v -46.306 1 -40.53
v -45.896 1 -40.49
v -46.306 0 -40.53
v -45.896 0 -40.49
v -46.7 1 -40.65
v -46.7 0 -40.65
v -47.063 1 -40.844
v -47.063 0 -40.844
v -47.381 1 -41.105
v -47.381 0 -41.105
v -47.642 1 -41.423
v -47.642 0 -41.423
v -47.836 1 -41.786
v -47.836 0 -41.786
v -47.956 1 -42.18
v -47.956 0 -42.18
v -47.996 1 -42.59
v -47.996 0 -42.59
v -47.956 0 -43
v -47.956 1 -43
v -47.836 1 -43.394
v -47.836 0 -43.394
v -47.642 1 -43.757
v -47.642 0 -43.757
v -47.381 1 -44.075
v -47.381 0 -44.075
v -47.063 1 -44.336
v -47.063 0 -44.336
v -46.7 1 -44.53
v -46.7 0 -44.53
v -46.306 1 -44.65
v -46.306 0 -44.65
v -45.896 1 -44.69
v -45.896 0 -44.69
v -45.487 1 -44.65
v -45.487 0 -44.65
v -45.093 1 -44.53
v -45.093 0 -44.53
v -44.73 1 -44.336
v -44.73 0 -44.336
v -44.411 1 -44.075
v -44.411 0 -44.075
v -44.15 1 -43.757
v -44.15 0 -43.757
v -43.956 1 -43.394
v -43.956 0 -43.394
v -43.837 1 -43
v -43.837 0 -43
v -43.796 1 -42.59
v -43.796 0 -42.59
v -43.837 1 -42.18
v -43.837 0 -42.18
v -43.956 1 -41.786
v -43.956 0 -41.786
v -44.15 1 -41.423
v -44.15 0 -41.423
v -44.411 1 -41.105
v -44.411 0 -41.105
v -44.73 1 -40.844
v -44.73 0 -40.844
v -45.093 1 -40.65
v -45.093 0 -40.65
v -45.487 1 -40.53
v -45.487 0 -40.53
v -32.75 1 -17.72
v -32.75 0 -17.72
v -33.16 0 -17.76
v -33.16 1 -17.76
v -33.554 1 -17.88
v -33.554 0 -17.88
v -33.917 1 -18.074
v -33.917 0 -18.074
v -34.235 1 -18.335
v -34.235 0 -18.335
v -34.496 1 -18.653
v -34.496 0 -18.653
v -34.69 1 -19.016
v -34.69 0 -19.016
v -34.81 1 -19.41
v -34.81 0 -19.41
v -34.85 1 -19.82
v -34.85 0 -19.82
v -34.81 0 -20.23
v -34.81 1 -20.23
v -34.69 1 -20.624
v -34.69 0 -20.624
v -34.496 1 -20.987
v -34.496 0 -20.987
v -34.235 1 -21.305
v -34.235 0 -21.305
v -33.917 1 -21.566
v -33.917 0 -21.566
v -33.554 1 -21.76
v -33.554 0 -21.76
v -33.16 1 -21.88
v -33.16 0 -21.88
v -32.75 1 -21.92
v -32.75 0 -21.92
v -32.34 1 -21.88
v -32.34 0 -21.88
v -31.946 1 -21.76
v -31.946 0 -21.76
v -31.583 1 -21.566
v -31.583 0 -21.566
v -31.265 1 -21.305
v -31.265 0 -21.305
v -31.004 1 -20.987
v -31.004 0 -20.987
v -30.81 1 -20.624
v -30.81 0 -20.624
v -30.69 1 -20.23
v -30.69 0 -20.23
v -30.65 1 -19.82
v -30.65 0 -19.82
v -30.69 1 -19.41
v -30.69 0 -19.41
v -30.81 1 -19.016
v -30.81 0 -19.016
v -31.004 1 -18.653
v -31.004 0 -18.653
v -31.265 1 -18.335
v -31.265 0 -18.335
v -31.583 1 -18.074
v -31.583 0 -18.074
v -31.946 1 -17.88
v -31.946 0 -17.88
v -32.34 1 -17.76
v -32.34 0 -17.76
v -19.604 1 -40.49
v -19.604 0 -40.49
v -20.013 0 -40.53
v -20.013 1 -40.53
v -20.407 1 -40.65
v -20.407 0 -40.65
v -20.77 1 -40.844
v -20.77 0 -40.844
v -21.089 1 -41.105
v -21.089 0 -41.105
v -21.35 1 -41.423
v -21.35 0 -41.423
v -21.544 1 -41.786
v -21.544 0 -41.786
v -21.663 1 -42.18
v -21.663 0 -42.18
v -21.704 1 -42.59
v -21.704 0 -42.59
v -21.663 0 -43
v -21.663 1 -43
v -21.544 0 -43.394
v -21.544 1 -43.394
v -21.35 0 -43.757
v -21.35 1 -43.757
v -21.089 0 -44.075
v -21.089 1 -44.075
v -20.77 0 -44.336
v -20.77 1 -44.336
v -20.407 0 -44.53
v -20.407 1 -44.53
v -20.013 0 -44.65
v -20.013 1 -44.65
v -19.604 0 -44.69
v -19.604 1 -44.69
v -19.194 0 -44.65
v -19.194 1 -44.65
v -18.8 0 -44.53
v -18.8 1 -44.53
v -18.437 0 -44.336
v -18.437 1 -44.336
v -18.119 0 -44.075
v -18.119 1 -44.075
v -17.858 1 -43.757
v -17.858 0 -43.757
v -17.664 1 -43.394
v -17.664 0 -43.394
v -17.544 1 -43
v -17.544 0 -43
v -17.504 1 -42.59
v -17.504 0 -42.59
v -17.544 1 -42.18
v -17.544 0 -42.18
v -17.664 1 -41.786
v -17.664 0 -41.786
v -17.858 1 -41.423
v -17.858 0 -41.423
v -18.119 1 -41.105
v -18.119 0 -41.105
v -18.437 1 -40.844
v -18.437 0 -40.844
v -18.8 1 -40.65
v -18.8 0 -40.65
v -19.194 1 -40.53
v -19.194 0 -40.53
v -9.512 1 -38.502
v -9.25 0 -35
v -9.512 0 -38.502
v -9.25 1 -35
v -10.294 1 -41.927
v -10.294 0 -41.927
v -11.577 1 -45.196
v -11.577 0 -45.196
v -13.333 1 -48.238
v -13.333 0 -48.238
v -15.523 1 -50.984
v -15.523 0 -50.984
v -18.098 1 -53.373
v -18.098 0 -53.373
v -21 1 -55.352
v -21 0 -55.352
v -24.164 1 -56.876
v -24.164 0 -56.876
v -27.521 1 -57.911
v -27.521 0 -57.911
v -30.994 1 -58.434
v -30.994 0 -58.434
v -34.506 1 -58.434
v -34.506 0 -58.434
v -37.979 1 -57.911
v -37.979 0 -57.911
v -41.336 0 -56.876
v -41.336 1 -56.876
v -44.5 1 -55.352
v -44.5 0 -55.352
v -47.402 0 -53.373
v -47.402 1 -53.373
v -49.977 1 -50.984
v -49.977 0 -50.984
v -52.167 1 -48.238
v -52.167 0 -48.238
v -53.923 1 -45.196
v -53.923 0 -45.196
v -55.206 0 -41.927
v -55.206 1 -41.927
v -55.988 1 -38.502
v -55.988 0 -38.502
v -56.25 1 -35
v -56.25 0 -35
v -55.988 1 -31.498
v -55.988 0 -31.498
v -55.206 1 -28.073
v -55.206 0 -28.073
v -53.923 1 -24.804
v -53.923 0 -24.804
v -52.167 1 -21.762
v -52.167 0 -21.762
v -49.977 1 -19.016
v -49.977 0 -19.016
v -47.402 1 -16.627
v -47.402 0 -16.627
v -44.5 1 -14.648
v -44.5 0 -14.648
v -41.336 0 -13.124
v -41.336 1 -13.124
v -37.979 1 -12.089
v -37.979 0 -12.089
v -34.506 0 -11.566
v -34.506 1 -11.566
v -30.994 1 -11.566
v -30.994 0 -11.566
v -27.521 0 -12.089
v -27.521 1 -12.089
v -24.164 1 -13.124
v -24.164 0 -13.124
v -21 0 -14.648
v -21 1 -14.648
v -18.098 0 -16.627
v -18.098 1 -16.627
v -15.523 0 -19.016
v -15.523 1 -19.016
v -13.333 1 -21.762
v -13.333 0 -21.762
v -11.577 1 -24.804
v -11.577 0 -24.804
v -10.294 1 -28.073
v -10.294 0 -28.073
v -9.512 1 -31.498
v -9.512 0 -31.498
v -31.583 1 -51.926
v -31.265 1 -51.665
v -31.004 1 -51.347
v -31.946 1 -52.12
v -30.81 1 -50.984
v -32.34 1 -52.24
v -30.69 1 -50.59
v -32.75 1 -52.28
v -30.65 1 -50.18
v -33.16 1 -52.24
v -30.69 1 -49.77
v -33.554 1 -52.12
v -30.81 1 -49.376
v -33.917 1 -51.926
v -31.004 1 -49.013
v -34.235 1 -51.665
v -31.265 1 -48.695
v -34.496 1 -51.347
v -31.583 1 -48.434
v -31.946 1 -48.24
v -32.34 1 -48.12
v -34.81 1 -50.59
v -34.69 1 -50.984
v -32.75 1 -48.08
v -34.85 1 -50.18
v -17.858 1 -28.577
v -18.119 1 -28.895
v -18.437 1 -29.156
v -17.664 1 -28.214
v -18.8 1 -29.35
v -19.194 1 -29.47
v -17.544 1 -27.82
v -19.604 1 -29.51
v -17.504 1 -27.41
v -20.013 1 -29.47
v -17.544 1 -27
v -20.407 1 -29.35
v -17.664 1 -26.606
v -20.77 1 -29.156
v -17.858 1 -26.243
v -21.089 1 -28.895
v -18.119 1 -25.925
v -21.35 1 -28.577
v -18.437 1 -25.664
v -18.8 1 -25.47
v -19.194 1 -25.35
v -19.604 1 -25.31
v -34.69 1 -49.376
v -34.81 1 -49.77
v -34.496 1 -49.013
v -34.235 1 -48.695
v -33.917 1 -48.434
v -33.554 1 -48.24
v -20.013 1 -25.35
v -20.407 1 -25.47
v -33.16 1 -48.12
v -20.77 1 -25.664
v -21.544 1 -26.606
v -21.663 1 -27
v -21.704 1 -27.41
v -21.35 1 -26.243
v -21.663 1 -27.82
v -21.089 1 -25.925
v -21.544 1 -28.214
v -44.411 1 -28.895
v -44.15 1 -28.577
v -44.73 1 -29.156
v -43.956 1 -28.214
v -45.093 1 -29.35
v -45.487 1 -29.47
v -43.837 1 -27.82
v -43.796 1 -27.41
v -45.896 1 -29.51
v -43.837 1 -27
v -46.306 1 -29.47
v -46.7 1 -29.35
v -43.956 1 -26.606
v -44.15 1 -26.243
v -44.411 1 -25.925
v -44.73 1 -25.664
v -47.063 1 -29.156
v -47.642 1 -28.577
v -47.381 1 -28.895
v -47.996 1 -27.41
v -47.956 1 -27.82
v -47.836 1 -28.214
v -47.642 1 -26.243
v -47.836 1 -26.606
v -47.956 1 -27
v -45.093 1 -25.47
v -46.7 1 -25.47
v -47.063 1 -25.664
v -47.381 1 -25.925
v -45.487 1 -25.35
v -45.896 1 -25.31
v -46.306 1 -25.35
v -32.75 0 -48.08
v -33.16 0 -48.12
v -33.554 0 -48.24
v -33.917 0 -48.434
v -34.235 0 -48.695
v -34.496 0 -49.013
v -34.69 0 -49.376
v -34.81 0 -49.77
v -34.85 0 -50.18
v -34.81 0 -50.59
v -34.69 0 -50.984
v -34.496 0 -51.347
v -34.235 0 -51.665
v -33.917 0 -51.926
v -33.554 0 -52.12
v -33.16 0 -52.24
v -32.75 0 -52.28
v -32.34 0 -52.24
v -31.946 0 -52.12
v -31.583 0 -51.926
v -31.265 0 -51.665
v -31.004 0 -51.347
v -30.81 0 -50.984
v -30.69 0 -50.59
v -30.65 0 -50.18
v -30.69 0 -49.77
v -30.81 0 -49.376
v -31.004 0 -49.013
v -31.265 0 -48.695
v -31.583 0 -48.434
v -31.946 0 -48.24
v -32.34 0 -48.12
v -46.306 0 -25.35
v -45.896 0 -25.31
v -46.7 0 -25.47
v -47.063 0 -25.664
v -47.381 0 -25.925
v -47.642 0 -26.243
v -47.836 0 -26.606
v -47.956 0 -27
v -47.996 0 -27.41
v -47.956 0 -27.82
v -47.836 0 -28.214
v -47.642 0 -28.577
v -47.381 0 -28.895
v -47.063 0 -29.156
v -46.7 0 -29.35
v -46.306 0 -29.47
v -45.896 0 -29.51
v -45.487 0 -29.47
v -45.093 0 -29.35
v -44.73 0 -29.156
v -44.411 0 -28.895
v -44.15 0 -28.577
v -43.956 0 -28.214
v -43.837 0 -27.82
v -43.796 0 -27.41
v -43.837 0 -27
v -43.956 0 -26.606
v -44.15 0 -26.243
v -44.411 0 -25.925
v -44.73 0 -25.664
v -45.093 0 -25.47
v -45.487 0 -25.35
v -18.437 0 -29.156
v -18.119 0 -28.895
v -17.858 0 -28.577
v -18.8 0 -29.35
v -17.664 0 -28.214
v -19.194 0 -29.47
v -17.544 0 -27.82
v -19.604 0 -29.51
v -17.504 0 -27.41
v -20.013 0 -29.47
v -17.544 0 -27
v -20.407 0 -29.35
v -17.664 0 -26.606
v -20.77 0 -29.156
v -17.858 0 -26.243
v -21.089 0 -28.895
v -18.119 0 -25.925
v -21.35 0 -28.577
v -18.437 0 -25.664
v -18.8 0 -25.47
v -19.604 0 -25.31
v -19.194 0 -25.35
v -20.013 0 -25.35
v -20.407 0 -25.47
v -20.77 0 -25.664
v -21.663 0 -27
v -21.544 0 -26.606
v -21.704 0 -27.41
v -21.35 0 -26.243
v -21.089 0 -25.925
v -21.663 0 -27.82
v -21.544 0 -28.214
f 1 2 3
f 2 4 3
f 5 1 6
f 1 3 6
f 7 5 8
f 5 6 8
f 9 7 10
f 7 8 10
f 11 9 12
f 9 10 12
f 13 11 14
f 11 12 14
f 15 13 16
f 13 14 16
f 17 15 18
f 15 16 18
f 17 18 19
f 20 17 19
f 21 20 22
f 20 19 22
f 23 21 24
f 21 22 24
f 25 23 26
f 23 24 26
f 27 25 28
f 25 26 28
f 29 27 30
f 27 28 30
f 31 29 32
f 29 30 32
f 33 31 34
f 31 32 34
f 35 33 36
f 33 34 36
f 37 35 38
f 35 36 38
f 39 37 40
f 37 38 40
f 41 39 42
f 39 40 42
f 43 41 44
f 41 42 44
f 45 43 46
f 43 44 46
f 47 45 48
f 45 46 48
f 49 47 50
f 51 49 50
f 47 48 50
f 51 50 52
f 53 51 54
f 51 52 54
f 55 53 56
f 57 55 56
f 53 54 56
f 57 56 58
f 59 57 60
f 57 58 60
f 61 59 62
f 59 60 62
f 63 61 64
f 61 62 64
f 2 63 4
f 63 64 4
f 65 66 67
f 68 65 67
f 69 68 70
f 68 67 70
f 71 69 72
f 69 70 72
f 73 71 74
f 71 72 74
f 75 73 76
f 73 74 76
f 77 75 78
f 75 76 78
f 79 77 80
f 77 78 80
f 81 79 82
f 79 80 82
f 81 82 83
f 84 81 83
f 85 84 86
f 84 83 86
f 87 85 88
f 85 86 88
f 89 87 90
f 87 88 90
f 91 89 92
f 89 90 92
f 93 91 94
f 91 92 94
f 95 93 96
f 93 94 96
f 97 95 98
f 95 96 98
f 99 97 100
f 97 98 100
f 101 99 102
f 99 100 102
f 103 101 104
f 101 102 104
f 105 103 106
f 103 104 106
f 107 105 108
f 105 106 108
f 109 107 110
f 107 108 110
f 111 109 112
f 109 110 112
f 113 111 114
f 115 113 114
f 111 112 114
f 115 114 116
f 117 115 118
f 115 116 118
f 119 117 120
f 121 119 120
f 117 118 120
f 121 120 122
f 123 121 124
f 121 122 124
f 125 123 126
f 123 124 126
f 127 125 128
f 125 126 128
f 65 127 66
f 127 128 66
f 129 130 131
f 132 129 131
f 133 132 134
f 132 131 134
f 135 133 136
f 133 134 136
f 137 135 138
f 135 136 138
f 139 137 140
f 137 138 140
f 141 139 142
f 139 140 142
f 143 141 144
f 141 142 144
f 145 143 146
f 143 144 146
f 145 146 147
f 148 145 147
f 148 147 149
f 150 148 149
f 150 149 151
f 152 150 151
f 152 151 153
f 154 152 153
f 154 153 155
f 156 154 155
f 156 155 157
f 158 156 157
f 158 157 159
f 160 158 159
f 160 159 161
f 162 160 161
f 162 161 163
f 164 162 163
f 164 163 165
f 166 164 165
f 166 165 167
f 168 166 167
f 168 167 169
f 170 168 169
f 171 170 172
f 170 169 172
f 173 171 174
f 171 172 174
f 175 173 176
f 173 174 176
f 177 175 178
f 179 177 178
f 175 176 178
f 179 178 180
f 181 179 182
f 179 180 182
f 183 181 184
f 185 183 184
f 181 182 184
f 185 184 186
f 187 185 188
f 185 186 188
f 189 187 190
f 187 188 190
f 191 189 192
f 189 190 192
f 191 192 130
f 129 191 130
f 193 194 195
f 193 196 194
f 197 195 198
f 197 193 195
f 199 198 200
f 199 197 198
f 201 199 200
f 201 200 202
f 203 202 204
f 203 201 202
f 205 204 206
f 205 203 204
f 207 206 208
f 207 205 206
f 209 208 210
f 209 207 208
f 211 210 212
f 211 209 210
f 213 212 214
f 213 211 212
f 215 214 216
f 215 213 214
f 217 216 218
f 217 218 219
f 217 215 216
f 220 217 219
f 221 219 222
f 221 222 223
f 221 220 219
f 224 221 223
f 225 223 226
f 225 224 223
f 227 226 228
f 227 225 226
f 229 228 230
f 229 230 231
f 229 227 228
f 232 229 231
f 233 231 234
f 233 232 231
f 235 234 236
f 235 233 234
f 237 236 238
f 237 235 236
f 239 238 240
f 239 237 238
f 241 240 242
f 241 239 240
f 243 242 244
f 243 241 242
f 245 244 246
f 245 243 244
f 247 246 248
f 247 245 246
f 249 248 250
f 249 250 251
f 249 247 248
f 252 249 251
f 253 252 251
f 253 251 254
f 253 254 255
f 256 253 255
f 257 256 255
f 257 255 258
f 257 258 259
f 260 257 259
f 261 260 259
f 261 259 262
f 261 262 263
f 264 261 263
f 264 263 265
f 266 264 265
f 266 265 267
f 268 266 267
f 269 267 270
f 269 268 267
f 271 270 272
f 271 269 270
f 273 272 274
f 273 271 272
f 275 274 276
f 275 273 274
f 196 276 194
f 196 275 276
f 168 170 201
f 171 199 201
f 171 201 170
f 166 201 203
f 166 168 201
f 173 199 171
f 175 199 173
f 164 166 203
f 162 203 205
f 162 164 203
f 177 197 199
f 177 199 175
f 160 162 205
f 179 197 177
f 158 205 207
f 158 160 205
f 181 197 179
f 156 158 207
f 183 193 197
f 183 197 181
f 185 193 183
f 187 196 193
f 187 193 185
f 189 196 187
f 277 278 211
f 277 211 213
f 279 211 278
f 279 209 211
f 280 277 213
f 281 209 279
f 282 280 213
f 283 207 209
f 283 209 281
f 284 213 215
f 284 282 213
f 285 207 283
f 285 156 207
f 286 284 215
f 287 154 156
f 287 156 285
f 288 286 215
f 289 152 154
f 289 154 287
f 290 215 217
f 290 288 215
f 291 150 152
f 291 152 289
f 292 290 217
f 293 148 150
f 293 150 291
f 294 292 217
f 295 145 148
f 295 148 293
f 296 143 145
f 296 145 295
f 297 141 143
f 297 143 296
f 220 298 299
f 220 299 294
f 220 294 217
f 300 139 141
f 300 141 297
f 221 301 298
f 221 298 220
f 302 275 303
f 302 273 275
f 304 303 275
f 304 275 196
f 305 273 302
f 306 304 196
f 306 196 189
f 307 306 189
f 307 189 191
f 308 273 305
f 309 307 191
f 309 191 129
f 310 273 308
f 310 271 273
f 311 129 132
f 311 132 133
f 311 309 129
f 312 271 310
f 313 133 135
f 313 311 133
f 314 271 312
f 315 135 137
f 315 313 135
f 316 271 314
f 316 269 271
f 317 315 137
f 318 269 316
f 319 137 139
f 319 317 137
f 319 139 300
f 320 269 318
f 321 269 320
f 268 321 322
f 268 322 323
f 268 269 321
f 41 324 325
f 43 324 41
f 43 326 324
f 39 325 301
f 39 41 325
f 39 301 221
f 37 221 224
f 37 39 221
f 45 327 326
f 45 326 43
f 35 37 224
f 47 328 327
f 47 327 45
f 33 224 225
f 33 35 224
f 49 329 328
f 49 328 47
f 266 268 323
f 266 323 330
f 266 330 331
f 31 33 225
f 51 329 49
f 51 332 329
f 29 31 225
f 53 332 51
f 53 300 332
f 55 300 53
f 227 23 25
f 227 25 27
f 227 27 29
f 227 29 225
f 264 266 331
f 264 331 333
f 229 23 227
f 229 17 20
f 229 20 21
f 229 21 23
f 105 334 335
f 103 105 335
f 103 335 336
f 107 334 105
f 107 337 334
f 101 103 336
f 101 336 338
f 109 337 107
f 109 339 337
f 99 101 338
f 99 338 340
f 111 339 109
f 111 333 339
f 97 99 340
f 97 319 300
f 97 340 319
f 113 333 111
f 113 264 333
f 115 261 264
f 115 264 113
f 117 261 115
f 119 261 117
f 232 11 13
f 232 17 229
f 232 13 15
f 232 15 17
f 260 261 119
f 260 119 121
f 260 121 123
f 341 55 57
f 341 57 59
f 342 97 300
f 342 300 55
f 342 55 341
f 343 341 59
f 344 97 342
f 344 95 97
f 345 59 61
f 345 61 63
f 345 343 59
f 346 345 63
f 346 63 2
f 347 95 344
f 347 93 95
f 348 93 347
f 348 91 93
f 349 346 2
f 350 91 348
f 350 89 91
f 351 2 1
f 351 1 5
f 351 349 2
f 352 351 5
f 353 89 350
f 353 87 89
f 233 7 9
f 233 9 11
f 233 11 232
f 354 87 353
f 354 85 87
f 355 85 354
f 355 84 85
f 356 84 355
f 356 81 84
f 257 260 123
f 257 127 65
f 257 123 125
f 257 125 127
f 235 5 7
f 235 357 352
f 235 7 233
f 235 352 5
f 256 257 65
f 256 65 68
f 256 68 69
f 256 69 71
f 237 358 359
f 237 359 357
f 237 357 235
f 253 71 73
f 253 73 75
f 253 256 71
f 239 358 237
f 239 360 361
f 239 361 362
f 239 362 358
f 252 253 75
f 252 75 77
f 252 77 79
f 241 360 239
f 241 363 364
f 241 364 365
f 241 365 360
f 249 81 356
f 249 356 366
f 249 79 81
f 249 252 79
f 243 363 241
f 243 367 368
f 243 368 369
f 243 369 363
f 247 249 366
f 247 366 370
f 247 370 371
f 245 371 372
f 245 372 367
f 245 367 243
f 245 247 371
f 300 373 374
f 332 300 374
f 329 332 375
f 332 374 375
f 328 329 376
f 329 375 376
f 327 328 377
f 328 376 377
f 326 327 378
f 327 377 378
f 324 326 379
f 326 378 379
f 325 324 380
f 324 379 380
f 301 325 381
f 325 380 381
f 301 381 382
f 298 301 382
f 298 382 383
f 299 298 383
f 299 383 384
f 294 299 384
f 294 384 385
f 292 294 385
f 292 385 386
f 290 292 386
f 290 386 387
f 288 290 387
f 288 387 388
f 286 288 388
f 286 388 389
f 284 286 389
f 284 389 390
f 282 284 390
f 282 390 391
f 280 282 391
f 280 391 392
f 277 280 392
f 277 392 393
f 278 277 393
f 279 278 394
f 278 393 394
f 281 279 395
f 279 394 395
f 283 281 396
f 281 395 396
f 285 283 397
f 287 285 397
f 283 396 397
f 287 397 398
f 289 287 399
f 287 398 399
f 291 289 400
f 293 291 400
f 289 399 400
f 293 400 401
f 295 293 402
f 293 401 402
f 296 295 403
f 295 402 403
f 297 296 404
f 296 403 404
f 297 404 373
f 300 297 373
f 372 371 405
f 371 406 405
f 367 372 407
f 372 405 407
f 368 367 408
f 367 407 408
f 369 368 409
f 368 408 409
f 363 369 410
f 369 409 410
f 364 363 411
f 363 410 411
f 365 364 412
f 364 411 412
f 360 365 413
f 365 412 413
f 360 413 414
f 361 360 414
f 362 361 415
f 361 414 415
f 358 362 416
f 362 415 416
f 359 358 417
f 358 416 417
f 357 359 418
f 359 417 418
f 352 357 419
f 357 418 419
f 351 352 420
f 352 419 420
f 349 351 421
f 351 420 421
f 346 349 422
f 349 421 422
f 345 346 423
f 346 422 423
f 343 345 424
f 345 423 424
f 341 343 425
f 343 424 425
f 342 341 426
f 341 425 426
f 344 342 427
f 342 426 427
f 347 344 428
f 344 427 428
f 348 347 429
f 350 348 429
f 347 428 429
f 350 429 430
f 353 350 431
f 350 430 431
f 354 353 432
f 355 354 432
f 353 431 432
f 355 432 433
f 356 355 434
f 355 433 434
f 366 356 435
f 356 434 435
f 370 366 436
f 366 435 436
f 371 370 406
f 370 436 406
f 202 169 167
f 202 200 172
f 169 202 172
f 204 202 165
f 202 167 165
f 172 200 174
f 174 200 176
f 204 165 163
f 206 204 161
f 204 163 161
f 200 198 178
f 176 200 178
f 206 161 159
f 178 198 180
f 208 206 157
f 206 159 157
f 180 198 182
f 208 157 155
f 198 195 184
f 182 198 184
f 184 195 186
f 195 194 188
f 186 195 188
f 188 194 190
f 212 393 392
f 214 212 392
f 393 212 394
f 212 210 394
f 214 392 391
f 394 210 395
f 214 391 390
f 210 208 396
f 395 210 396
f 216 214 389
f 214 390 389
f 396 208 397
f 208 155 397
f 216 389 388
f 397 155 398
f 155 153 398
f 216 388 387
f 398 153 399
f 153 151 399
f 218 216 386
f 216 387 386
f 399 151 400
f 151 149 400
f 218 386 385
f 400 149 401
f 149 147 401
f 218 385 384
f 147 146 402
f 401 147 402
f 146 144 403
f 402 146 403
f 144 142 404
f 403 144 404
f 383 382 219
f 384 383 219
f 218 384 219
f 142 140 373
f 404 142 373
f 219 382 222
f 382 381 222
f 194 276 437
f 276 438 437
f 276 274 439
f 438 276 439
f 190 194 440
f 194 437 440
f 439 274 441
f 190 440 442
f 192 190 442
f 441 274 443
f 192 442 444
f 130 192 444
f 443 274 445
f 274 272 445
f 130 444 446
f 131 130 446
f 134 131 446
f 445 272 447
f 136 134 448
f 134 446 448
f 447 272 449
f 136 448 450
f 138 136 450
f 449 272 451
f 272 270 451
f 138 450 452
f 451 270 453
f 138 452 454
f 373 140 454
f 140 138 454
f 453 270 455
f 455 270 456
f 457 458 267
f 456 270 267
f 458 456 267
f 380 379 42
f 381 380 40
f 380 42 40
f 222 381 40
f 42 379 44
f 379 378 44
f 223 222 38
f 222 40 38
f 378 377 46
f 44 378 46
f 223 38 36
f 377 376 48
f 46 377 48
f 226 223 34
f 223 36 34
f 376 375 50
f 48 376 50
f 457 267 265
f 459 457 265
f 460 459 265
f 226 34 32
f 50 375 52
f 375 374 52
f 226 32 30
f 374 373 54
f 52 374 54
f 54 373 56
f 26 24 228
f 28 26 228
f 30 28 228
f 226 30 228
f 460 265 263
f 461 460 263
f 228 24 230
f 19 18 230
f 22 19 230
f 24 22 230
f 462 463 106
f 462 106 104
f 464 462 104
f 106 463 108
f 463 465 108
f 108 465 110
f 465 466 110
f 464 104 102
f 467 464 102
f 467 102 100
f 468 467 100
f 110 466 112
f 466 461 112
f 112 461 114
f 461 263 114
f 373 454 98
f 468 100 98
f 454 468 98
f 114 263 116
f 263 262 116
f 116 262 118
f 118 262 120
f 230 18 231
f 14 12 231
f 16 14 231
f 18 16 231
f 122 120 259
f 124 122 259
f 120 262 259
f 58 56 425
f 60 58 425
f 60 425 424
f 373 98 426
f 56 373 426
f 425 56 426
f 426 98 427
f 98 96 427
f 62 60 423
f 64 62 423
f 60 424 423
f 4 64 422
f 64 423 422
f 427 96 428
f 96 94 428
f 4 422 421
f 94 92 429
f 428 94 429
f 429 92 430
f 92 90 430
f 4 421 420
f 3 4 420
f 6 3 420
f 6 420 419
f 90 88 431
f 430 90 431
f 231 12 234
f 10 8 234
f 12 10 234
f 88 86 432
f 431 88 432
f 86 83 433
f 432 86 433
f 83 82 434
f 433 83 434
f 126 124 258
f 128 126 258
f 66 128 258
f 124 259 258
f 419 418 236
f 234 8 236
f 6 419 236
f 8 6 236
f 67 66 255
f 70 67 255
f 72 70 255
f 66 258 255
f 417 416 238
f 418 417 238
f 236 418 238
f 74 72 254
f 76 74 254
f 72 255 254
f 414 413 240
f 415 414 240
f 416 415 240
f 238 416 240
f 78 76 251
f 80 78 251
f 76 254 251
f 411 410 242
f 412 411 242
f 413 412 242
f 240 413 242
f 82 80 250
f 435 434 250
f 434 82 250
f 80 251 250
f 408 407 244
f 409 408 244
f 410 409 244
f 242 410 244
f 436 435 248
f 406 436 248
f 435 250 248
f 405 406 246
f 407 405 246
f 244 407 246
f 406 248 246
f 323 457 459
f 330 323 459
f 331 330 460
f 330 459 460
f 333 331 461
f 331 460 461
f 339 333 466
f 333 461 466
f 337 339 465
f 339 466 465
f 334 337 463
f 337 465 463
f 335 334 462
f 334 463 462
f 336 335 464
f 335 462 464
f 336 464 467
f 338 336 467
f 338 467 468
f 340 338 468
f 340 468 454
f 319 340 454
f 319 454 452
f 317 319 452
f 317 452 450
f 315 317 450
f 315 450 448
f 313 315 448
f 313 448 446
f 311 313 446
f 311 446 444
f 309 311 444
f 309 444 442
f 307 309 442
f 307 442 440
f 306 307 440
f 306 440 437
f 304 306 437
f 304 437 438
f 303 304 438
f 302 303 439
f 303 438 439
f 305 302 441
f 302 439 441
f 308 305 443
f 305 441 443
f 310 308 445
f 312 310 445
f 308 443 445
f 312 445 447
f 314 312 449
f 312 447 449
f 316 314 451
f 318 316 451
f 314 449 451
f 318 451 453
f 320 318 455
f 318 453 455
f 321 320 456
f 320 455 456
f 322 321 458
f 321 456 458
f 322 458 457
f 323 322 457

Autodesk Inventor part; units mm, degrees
ref_plane "YZ Plane" through (0, 0, 0) normal (1, 0, 0) x (0, 1, 0)
ref_plane "XZ Plane" through (0, 0, 0) normal (0, 1, 0) x (-1, 0, 0)
ref_plane "XY Plane" through (0, 0, 0) normal (0, 0, 1) x (1, 0, 0)
sketch "スケッチ1" plane through (0, 0, 0) normal (0, 1, 0) x (-1, 0, 0)
  line L0 (0, 0) -> (65.5, 0)
  line L1 (65.5, 0) -> (65.5, -70)
  line L2 (65.5, -70) -> (0, -70)
  line L3 (0, -70) -> (0, 0)
  dimension "d0" = 65.5
  dimension "d1" = 70
extrude "押し出し1" add sketch "スケッチ1" along normal blind 1
sketch "スケッチ3" plane through (0, 1, 0) normal (0, 1, 0) x (1, 0, 0)
  line L0 (-65.5, 0) -> (0, 0) projected
  line L1 (-32.75, 0) -> (-32.75, 70)
  line L2 (0, 70) -> (-65.5, 70) projected
  circle A0 centre (-32.75, 35) radius 15.18
  point P0 (-32.75, 50.18)
  point P1 (-45.8963, 42.59)
  point P2 (-45.8963, 27.41)
  point P3 (-32.75, 19.82)
  point P4 (-19.6037, 27.41)
  point P5 (-19.6037, 42.59)
  dimension "d15" = 30.36
  dimension "d18" = 360
hole "穴2" at (-32.75, 1, -50.18) at (-45.8963, 1, -42.59) at (-45.8963, 1, -27.41) at (-32.75, 1, -19.82) at (-19.6037, 1, -27.41) at (-19.6037, 1, -42.59) direction (0, -1, 0) diameter 4.2 end through all
sketch "スケッチ4" plane through (0, 1, 0) normal (0, 1, 0) x (1, 0, 0)
  line L0 (-65.5, 70) -> (-65.5, 0) projected
  line L1 (0, 70) -> (-65.5, 70) projected
  circle A0 centre (-32.75, 35) radius 23.5
  line L2 (0, 0) -> (0, 70) projected
  line L3 (-65.5, 70) -> (0, 70)
  line L4 (0, 70) -> (0, 0)
  line L5 (0, 0) -> (-65.5, 0)
  line L6 (-65.5, 0) -> (-65.5, 70)
  dimension "d27" = 47
  dimension "d28" = 35
  dimension "d29" = 32.75
extrude "押し出し2" cut sketch "スケッチ4" against normal blind 1
properties part number "link2_plate5" material "アルミニウム 6061"
